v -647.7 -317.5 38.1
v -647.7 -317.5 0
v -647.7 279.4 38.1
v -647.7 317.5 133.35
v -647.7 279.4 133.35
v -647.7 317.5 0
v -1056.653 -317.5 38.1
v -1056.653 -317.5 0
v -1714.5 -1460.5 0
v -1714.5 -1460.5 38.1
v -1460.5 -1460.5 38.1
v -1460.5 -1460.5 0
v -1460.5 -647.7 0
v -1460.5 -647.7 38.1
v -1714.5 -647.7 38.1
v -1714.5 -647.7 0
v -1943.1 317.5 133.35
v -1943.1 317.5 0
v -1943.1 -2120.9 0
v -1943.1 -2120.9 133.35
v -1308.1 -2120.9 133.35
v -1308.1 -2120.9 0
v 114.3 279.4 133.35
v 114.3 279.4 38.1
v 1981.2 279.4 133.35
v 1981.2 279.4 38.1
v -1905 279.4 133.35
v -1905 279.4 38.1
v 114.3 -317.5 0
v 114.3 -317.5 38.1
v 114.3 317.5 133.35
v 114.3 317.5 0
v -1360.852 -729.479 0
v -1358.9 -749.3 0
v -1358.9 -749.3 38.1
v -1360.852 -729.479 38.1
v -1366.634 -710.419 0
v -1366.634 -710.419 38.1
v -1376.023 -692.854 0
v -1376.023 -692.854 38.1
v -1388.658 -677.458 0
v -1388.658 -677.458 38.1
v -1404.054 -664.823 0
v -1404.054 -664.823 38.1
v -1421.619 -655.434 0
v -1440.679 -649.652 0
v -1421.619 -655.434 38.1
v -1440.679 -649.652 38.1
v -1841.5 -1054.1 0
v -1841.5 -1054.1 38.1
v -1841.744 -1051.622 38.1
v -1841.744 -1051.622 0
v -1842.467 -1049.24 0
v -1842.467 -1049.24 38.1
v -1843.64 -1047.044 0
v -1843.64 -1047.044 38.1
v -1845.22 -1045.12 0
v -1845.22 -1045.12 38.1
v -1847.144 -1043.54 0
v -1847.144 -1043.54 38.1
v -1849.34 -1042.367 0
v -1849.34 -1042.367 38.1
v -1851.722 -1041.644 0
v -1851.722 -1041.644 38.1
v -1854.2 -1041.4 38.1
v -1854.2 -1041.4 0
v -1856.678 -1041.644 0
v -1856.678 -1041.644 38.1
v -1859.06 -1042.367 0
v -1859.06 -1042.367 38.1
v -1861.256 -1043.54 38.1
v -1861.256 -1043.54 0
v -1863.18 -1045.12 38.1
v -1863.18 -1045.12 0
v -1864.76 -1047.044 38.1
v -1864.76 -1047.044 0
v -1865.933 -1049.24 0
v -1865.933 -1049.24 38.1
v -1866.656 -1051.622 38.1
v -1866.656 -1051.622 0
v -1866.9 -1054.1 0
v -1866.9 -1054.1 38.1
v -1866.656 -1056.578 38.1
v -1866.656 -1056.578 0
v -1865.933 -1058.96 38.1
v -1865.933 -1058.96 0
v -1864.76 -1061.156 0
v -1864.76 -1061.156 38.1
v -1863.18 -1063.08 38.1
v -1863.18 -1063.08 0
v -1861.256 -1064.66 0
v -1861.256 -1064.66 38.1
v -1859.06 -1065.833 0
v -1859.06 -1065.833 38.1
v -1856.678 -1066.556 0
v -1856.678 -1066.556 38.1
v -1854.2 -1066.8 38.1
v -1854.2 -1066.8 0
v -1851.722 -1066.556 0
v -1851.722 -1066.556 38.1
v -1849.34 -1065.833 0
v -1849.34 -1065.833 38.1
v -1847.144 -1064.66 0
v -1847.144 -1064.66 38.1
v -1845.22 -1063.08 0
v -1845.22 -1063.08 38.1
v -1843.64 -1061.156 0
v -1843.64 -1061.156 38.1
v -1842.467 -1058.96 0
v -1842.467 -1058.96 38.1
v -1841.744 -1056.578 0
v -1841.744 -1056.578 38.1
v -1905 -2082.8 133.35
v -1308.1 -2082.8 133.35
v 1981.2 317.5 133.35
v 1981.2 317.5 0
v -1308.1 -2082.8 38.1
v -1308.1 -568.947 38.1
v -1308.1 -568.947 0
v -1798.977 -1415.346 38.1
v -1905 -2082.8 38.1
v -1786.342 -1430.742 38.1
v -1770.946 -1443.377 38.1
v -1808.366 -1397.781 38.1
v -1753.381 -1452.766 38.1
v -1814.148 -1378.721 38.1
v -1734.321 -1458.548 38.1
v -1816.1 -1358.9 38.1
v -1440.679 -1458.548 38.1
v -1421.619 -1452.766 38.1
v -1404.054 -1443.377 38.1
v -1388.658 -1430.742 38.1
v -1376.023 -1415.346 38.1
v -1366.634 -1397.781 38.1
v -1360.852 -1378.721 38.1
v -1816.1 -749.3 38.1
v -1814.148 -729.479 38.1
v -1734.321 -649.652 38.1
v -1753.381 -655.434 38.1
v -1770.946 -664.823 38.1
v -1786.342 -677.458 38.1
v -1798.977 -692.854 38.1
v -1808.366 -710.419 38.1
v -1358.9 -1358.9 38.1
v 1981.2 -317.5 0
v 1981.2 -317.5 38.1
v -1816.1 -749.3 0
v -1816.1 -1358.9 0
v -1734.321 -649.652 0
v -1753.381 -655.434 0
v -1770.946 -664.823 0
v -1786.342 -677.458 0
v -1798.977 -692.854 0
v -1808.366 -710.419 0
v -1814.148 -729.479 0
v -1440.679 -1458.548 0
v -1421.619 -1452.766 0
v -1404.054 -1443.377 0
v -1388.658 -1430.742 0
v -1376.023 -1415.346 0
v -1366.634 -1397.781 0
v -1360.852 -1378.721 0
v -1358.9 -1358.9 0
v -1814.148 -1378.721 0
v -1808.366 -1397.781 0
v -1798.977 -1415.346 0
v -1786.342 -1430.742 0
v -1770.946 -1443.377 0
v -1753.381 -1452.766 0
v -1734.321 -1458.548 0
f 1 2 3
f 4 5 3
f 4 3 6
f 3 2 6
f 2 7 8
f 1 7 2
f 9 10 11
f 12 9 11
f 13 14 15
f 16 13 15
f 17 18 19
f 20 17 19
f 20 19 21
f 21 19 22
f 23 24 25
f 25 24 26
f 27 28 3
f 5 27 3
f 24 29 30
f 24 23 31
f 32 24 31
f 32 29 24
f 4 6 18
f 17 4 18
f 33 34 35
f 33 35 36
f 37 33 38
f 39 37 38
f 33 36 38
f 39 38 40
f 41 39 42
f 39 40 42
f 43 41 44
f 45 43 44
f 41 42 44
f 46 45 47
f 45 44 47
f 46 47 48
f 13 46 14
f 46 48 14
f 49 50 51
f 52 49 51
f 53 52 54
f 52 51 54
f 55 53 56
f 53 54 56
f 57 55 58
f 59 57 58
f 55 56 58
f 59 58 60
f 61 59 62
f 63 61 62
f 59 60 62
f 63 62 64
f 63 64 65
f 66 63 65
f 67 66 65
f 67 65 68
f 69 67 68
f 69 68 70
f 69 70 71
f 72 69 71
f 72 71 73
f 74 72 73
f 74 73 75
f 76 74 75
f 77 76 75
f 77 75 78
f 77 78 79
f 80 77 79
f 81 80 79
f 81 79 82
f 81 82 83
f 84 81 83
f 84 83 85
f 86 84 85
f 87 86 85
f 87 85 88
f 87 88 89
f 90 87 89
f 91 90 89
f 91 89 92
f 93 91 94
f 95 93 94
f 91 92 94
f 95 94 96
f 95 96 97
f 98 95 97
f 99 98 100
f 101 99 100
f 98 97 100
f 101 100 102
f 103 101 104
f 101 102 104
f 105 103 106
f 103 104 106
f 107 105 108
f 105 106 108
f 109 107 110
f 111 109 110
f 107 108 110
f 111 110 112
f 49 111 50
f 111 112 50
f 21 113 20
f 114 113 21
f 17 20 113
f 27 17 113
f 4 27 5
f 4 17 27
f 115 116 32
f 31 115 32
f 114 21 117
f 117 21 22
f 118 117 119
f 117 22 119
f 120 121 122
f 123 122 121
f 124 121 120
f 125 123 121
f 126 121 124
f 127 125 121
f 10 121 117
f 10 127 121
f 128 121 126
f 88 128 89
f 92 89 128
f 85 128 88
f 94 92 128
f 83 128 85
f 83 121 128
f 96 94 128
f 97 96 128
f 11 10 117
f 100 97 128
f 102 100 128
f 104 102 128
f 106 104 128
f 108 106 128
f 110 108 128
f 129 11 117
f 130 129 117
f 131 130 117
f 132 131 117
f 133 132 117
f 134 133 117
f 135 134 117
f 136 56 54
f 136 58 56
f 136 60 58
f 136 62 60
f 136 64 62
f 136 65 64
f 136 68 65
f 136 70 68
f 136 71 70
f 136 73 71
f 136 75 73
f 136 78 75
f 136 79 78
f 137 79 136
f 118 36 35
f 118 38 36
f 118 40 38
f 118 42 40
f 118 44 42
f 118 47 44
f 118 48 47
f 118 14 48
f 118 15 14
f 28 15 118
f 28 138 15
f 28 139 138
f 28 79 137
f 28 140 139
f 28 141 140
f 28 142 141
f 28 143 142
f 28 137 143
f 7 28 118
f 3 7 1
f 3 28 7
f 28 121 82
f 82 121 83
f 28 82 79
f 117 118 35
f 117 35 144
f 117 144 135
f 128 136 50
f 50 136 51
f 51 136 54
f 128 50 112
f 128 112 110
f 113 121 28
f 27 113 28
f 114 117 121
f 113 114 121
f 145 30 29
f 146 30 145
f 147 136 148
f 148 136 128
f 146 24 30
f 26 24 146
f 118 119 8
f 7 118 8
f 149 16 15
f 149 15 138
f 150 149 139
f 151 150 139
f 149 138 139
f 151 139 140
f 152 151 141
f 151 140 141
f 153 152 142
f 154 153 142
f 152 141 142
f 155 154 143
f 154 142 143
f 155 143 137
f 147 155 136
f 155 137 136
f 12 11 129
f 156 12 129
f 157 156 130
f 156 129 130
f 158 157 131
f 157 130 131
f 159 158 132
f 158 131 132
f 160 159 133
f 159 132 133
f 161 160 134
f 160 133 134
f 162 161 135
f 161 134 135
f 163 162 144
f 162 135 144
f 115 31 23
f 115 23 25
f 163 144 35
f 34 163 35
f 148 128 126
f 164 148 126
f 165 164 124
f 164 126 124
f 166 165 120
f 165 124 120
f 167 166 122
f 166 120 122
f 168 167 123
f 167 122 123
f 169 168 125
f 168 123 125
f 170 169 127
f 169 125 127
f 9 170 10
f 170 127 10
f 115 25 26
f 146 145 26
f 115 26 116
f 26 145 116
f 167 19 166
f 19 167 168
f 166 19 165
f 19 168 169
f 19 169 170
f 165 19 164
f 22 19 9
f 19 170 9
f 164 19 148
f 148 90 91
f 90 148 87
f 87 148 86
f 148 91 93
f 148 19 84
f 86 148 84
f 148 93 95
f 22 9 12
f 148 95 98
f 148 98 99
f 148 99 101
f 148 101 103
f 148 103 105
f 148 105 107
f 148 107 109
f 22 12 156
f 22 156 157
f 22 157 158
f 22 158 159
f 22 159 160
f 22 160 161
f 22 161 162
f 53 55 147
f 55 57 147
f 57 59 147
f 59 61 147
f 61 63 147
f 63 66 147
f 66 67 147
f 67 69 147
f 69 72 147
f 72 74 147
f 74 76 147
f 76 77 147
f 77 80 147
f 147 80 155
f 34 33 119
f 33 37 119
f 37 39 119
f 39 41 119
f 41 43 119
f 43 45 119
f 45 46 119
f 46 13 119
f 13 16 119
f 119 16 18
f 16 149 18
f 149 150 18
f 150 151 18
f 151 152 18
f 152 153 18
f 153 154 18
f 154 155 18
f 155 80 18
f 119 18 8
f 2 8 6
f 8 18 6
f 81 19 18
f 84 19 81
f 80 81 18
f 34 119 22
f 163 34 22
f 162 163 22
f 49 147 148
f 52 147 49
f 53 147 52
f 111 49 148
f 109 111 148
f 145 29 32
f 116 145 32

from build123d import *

# Parameters (mm, degrees)
F0_W          = 38.1
F0_H          = 635
F1_DEPTH      = 38.1
F2_DEPTH      = 876.3
F4_DEPTH      = 95.25
F5_W          = 762
F5_H          = 807.1839261055
F6_DEPTH      = 203.2
F6_DEPTH_BACK = 203.2
F7_R          = 12.7
F8_DEPTH      = 127
F9_DEPTH      = 127


with BuildPart() as f1:
    # F0 (on Top) → F1 (new body)
    with BuildSketch(Plane.XY):
        Polygon((1943.1, -317.5), (1943.1, 317.5), (-1943.1, 317.5), (-1943.1, -317.5), (-1308.1, -317.5), (-1056.6528286101, -317.5), align=None)
        Polygon((-1308.1, -317.5), (-1943.1, -317.5), (-1943.1, -2120.9), (-1308.1, -2120.9), (-1308.1, -568.9471713899), align=None)
        with Locations((1962.15, 0)):
            Rectangle(F0_W, F0_H)
        Polygon((-1308.1, -568.9471713899), (-1056.6528286101, -317.5), (-1308.1, -317.5), align=None)
    extrude(amount=F1_DEPTH)

    # F0 (on Top) → F2 (join)
    with BuildSketch(Plane.XY):
        with Locations((1962.15, 0)):
            Rectangle(F0_W, F0_H)
    extrude(amount=-F2_DEPTH)

    # F3 (on face) → F4 (join)
    with BuildSketch(Plane.XY.offset(38.1)):
        Polygon((-1943.1, 279.4), (-1943.1, -2120.9), (-1905, -2120.9), (-1308.1, -2120.9), (-1308.1, -2082.8), (-1905, -2082.8), (-1905, 279.4), (1981.2, 279.4), (1981.2, 317.5), (-1905, 317.5), (-1943.1, 317.5), align=None)
    extrude(amount=F4_DEPTH)

    # F5 (on face) → F6 (cut, two sides)
    with BuildSketch(Plane.XY.offset(38.1)) as f6_sk:
        with Locations((-266.7, 86.0919630527)):
            Rectangle(F5_W, F5_H)
    extrude(amount=-F6_DEPTH, mode=Mode.SUBTRACT)
    extrude(f6_sk.sketch, amount=F6_DEPTH_BACK, mode=Mode.SUBTRACT)

    # F7 (on face) → F8 (cut)
    with BuildSketch(Plane.XY.offset(38.1)):
        with BuildLine():
            ThreePointArc((-1358.9, -749.3), (-1388.6579510314, -677.4579510314), (-1460.5, -647.7))
            Line((-1460.5, -647.7), (-1714.5, -647.7))
            ThreePointArc((-1714.5, -647.7), (-1786.3420489686, -677.4579510314), (-1816.1, -749.3))
            Line((-1816.1, -749.3), (-1816.1, -1358.9))
            ThreePointArc((-1816.1, -1358.9), (-1786.3420489686, -1430.7420489686), (-1714.5, -1460.5))
            Line((-1714.5, -1460.5), (-1460.5, -1460.5))
            ThreePointArc((-1460.5, -1460.5), (-1388.6579510314, -1430.7420489686), (-1358.9, -1358.9))
            Line((-1358.9, -1358.9), (-1358.9, -749.3))
        make_face()
        with Locations((-1854.2, -1054.1)):
            Circle(F7_R)
    extrude(amount=-F8_DEPTH, mode=Mode.SUBTRACT)

    # F9 (cut): a face of the model
    f9_faces = [f1.faces().sort_by_distance(p)[0] for p in [
        (1943.1, 0, -438.15),
    ]]
    extrude(f9_faces, amount=-F9_DEPTH, mode=Mode.SUBTRACT)


solid = f1.part
